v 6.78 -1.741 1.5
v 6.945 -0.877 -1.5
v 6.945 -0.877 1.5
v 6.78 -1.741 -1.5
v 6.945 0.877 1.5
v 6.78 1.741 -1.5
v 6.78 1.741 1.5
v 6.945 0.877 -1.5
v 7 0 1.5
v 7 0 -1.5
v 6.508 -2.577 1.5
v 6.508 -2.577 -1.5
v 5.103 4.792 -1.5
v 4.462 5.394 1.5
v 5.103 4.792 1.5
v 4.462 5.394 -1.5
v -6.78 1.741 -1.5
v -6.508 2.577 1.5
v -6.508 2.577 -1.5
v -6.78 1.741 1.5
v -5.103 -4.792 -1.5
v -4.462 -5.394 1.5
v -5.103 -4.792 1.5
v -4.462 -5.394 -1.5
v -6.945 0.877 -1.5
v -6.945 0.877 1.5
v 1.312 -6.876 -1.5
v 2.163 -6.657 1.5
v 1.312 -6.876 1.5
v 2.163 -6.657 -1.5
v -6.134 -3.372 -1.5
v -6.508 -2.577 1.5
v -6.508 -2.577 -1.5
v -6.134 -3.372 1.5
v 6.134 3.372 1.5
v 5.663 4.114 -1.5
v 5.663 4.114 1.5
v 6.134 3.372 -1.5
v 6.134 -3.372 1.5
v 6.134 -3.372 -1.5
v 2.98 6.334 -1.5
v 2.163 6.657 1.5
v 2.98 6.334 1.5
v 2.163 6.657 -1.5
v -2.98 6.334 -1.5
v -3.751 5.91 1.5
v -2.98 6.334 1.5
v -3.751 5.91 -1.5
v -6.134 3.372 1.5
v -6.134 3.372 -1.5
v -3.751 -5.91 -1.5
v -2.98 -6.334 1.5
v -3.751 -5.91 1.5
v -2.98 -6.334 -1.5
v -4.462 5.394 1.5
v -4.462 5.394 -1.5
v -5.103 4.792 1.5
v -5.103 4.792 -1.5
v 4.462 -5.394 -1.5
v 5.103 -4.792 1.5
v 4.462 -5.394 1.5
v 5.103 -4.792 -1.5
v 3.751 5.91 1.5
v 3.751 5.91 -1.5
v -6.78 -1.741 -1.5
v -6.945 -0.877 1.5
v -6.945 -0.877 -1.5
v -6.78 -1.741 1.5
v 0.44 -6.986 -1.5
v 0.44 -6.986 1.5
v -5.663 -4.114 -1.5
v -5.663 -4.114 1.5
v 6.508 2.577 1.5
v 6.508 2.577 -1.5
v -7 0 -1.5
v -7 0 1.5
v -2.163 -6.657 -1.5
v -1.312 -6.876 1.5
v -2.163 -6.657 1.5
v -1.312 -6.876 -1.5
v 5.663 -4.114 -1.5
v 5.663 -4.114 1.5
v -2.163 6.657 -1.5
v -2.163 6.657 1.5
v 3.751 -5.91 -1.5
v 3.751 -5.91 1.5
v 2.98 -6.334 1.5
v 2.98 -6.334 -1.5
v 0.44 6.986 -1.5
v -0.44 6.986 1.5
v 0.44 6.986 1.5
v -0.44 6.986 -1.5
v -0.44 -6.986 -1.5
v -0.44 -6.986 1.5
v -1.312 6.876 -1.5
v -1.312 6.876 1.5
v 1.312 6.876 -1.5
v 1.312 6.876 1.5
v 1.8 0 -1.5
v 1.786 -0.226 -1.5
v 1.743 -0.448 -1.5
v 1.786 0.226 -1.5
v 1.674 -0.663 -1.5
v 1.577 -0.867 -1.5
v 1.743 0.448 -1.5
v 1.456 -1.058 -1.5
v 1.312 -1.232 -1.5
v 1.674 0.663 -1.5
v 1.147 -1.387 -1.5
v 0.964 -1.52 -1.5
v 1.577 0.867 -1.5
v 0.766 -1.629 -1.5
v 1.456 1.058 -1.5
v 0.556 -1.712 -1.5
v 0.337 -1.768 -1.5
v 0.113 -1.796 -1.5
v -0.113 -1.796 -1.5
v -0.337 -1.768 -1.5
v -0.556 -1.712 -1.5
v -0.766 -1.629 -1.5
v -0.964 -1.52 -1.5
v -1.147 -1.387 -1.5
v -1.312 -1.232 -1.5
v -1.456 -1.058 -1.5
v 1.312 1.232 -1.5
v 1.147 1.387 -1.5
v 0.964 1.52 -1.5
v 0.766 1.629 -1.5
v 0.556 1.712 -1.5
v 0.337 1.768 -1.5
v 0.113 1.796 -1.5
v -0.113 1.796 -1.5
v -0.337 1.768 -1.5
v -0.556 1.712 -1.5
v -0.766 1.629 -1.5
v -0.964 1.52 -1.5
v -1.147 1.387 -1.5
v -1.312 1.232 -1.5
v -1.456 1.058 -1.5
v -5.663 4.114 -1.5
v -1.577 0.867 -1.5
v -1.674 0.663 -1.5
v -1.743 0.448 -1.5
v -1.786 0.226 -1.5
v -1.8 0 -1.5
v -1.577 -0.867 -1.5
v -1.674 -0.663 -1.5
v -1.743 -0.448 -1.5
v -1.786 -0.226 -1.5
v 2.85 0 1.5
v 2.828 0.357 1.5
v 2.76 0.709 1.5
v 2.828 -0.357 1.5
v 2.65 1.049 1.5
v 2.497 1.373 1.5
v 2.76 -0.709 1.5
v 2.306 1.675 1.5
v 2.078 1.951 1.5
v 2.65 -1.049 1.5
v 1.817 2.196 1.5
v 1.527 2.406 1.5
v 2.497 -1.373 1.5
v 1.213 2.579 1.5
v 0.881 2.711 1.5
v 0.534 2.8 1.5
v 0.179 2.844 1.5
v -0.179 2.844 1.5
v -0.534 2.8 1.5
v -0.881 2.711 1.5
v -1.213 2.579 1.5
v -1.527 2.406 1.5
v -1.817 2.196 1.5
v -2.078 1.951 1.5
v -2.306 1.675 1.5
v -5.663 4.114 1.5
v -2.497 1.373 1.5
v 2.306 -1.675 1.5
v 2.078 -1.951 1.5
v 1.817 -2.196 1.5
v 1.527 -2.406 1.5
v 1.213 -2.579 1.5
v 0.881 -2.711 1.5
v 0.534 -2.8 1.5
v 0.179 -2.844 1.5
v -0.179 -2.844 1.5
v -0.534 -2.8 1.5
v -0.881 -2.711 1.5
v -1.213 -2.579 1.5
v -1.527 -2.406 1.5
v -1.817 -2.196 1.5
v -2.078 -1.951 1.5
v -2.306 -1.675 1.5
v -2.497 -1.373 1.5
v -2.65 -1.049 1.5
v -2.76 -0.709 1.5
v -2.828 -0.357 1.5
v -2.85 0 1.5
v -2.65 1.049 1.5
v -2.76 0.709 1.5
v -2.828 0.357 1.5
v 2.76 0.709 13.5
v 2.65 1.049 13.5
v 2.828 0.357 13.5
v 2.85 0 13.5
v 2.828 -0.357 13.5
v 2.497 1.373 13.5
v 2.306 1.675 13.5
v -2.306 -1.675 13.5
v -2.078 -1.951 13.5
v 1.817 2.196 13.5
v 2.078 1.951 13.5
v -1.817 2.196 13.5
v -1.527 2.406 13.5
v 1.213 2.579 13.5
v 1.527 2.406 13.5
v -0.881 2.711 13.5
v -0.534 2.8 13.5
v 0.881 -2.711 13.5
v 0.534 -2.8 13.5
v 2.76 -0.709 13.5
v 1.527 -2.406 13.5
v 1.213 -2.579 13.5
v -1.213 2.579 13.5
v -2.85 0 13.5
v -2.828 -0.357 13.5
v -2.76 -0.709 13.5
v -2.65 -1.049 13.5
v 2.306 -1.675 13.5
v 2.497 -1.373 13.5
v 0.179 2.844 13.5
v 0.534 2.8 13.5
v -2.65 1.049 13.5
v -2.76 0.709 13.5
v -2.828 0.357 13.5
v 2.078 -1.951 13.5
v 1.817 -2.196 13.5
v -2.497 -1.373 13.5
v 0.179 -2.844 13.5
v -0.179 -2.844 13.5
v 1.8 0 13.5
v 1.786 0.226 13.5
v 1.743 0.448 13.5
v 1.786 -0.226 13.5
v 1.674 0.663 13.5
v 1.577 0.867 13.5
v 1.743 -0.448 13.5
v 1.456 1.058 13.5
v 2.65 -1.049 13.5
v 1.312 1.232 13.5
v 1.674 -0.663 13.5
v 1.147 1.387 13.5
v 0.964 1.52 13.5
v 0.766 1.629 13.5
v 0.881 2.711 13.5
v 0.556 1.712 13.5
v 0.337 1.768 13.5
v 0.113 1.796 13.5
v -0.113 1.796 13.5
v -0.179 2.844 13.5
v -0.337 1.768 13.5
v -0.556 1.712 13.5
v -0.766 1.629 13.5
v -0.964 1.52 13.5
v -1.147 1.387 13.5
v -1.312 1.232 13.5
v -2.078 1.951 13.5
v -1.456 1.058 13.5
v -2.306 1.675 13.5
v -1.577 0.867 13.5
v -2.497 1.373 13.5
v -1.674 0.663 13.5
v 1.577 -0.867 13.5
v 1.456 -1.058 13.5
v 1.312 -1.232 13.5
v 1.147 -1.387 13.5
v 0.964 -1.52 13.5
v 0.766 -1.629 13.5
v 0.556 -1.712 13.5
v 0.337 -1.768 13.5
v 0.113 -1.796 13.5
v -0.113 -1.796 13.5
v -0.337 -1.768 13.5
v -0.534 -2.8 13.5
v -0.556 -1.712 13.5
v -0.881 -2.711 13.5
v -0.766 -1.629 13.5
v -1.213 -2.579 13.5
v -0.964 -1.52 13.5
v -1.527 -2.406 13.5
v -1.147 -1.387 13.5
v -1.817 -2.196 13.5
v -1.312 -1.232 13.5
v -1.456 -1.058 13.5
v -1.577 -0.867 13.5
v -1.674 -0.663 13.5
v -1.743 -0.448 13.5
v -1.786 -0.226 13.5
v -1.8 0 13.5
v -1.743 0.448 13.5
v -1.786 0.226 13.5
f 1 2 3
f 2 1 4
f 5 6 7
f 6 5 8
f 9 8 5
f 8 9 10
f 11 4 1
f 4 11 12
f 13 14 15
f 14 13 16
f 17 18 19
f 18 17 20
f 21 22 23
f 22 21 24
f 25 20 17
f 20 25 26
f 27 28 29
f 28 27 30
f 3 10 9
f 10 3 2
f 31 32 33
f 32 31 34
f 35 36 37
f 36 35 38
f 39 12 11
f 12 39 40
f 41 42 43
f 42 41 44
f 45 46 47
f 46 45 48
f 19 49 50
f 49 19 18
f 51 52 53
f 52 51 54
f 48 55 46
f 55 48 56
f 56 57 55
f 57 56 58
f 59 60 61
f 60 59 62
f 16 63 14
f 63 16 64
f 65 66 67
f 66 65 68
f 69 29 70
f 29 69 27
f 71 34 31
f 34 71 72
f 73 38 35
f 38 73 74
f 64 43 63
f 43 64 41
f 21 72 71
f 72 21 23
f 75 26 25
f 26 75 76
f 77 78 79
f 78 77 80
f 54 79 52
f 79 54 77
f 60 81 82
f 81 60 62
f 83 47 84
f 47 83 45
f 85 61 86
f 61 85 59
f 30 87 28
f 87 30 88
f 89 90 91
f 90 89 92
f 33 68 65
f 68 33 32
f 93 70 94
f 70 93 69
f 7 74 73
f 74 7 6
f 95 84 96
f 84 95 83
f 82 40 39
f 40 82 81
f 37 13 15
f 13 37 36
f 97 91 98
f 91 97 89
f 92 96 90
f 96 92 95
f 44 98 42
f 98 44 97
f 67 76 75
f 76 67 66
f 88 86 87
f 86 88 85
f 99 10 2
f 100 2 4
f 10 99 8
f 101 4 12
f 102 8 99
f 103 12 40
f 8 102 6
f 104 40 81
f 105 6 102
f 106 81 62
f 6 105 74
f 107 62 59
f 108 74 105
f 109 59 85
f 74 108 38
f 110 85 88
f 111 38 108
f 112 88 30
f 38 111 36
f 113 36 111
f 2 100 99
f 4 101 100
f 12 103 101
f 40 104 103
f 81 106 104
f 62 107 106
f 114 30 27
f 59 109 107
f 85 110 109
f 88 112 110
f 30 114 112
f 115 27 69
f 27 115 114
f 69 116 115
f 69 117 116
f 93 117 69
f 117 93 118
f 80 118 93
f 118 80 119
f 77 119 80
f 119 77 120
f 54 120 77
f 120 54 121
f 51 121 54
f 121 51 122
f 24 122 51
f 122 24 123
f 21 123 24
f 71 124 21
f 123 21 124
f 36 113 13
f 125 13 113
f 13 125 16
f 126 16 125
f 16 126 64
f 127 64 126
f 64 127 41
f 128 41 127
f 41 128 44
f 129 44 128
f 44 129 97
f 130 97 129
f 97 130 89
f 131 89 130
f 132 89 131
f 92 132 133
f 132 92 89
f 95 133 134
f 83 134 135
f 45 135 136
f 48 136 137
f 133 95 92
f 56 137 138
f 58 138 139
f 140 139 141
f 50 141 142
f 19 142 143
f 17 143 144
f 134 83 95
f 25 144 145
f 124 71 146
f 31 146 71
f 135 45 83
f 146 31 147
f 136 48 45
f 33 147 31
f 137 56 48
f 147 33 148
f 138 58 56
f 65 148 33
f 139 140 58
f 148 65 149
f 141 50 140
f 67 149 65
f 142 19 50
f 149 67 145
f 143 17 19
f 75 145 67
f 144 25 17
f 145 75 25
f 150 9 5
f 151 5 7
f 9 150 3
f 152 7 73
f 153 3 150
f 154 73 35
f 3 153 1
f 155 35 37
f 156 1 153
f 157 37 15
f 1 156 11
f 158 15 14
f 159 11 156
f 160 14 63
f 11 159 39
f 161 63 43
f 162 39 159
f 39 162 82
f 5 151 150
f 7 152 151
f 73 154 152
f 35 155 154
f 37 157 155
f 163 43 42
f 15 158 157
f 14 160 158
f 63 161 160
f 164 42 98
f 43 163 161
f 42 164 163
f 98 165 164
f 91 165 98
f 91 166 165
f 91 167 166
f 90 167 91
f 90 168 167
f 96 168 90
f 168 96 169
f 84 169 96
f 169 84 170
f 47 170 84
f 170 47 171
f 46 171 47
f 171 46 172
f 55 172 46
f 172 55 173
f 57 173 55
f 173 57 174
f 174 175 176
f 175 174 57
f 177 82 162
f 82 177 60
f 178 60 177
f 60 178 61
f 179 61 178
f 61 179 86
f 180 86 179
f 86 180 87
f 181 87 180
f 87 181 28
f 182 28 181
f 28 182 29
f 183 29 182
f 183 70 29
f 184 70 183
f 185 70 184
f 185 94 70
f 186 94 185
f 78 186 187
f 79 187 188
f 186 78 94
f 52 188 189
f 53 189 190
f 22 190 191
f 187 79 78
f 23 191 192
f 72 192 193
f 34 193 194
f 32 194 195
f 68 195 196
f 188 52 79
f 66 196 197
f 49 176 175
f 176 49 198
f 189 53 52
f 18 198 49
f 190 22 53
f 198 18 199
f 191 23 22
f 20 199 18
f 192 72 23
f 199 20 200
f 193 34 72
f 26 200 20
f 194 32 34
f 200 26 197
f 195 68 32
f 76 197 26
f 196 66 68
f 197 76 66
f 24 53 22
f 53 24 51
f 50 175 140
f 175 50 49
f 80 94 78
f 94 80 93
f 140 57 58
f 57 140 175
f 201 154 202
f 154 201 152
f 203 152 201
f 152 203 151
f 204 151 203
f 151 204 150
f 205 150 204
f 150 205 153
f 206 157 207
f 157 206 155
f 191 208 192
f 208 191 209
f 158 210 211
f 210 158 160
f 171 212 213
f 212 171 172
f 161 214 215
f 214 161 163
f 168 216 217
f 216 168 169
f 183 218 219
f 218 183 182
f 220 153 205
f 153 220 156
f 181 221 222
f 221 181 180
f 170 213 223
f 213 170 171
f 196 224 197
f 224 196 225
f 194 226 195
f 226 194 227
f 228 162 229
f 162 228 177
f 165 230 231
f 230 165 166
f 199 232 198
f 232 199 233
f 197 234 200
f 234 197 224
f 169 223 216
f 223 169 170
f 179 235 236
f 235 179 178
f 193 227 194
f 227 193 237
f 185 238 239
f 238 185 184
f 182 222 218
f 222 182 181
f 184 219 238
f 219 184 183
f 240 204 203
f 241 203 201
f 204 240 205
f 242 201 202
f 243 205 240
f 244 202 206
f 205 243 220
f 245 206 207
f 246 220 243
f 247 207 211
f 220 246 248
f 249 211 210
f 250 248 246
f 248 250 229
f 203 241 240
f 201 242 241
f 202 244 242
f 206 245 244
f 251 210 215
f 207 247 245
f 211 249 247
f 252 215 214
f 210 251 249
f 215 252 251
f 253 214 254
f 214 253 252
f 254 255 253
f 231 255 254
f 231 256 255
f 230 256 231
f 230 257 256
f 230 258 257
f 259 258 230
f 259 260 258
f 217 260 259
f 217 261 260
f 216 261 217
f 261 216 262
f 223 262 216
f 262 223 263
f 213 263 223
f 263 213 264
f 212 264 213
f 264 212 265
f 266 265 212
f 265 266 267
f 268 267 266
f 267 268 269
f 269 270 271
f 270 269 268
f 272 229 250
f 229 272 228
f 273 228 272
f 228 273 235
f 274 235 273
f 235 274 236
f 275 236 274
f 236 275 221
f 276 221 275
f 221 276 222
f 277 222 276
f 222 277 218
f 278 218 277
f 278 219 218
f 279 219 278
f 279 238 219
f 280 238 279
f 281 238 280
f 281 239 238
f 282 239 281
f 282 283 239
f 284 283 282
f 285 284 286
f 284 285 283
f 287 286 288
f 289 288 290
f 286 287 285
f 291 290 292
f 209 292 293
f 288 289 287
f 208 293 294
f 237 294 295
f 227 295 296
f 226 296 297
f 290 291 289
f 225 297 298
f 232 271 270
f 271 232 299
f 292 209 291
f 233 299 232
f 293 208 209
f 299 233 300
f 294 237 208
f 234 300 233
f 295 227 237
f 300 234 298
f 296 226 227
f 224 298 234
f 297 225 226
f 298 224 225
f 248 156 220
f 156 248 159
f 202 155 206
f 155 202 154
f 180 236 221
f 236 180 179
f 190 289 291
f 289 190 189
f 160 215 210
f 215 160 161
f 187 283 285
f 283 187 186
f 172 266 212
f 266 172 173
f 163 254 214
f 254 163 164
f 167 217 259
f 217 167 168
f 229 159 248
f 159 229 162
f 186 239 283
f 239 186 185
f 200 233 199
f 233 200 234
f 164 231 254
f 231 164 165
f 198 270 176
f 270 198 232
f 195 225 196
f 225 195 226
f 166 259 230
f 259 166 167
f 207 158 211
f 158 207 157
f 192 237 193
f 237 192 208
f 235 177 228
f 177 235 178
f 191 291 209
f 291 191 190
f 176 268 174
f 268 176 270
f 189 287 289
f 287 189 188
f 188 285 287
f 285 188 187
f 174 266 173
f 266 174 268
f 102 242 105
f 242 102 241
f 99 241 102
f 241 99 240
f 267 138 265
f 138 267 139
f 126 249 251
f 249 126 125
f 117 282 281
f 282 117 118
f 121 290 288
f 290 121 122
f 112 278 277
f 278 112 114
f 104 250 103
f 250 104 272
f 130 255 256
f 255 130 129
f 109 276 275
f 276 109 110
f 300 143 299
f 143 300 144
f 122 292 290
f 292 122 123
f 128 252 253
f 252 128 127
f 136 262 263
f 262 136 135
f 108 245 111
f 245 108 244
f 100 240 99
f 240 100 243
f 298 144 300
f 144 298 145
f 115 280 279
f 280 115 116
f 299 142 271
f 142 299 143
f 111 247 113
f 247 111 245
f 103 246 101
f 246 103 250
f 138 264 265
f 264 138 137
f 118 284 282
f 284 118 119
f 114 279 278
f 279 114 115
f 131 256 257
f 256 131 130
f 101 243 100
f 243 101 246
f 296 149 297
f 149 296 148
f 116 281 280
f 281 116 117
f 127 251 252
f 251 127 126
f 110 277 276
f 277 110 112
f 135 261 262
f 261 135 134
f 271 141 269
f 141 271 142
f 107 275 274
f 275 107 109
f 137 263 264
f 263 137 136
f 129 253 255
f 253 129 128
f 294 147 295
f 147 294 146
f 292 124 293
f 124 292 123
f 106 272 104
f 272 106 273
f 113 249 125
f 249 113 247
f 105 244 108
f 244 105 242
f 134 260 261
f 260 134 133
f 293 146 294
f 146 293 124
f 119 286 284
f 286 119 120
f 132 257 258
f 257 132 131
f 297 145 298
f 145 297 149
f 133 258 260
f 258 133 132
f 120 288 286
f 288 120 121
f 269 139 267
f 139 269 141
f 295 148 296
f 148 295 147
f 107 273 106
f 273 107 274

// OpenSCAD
$fn = 50;


difference() {
	union() {
		translate(v = [0, 0, -1.5000000000]) {
			rotate(a = [0, 0, 0]) {
				cylinder(h = 3, r = 7.0000000000);
			}
		}
		translate(v = [0, 0, -1.5000000000]) {
			rotate(a = [0, 0, 0]) {
				cylinder(h = 15, r = 2.8500000000);
			}
		}
	}
	union() {
		translate(v = [0, 0, -125.0000000000]) {
			rotate(a = [0, 0, 0]) {
				cylinder(h = 250, r = 1.8000000000);
			}
		}
	}
}
